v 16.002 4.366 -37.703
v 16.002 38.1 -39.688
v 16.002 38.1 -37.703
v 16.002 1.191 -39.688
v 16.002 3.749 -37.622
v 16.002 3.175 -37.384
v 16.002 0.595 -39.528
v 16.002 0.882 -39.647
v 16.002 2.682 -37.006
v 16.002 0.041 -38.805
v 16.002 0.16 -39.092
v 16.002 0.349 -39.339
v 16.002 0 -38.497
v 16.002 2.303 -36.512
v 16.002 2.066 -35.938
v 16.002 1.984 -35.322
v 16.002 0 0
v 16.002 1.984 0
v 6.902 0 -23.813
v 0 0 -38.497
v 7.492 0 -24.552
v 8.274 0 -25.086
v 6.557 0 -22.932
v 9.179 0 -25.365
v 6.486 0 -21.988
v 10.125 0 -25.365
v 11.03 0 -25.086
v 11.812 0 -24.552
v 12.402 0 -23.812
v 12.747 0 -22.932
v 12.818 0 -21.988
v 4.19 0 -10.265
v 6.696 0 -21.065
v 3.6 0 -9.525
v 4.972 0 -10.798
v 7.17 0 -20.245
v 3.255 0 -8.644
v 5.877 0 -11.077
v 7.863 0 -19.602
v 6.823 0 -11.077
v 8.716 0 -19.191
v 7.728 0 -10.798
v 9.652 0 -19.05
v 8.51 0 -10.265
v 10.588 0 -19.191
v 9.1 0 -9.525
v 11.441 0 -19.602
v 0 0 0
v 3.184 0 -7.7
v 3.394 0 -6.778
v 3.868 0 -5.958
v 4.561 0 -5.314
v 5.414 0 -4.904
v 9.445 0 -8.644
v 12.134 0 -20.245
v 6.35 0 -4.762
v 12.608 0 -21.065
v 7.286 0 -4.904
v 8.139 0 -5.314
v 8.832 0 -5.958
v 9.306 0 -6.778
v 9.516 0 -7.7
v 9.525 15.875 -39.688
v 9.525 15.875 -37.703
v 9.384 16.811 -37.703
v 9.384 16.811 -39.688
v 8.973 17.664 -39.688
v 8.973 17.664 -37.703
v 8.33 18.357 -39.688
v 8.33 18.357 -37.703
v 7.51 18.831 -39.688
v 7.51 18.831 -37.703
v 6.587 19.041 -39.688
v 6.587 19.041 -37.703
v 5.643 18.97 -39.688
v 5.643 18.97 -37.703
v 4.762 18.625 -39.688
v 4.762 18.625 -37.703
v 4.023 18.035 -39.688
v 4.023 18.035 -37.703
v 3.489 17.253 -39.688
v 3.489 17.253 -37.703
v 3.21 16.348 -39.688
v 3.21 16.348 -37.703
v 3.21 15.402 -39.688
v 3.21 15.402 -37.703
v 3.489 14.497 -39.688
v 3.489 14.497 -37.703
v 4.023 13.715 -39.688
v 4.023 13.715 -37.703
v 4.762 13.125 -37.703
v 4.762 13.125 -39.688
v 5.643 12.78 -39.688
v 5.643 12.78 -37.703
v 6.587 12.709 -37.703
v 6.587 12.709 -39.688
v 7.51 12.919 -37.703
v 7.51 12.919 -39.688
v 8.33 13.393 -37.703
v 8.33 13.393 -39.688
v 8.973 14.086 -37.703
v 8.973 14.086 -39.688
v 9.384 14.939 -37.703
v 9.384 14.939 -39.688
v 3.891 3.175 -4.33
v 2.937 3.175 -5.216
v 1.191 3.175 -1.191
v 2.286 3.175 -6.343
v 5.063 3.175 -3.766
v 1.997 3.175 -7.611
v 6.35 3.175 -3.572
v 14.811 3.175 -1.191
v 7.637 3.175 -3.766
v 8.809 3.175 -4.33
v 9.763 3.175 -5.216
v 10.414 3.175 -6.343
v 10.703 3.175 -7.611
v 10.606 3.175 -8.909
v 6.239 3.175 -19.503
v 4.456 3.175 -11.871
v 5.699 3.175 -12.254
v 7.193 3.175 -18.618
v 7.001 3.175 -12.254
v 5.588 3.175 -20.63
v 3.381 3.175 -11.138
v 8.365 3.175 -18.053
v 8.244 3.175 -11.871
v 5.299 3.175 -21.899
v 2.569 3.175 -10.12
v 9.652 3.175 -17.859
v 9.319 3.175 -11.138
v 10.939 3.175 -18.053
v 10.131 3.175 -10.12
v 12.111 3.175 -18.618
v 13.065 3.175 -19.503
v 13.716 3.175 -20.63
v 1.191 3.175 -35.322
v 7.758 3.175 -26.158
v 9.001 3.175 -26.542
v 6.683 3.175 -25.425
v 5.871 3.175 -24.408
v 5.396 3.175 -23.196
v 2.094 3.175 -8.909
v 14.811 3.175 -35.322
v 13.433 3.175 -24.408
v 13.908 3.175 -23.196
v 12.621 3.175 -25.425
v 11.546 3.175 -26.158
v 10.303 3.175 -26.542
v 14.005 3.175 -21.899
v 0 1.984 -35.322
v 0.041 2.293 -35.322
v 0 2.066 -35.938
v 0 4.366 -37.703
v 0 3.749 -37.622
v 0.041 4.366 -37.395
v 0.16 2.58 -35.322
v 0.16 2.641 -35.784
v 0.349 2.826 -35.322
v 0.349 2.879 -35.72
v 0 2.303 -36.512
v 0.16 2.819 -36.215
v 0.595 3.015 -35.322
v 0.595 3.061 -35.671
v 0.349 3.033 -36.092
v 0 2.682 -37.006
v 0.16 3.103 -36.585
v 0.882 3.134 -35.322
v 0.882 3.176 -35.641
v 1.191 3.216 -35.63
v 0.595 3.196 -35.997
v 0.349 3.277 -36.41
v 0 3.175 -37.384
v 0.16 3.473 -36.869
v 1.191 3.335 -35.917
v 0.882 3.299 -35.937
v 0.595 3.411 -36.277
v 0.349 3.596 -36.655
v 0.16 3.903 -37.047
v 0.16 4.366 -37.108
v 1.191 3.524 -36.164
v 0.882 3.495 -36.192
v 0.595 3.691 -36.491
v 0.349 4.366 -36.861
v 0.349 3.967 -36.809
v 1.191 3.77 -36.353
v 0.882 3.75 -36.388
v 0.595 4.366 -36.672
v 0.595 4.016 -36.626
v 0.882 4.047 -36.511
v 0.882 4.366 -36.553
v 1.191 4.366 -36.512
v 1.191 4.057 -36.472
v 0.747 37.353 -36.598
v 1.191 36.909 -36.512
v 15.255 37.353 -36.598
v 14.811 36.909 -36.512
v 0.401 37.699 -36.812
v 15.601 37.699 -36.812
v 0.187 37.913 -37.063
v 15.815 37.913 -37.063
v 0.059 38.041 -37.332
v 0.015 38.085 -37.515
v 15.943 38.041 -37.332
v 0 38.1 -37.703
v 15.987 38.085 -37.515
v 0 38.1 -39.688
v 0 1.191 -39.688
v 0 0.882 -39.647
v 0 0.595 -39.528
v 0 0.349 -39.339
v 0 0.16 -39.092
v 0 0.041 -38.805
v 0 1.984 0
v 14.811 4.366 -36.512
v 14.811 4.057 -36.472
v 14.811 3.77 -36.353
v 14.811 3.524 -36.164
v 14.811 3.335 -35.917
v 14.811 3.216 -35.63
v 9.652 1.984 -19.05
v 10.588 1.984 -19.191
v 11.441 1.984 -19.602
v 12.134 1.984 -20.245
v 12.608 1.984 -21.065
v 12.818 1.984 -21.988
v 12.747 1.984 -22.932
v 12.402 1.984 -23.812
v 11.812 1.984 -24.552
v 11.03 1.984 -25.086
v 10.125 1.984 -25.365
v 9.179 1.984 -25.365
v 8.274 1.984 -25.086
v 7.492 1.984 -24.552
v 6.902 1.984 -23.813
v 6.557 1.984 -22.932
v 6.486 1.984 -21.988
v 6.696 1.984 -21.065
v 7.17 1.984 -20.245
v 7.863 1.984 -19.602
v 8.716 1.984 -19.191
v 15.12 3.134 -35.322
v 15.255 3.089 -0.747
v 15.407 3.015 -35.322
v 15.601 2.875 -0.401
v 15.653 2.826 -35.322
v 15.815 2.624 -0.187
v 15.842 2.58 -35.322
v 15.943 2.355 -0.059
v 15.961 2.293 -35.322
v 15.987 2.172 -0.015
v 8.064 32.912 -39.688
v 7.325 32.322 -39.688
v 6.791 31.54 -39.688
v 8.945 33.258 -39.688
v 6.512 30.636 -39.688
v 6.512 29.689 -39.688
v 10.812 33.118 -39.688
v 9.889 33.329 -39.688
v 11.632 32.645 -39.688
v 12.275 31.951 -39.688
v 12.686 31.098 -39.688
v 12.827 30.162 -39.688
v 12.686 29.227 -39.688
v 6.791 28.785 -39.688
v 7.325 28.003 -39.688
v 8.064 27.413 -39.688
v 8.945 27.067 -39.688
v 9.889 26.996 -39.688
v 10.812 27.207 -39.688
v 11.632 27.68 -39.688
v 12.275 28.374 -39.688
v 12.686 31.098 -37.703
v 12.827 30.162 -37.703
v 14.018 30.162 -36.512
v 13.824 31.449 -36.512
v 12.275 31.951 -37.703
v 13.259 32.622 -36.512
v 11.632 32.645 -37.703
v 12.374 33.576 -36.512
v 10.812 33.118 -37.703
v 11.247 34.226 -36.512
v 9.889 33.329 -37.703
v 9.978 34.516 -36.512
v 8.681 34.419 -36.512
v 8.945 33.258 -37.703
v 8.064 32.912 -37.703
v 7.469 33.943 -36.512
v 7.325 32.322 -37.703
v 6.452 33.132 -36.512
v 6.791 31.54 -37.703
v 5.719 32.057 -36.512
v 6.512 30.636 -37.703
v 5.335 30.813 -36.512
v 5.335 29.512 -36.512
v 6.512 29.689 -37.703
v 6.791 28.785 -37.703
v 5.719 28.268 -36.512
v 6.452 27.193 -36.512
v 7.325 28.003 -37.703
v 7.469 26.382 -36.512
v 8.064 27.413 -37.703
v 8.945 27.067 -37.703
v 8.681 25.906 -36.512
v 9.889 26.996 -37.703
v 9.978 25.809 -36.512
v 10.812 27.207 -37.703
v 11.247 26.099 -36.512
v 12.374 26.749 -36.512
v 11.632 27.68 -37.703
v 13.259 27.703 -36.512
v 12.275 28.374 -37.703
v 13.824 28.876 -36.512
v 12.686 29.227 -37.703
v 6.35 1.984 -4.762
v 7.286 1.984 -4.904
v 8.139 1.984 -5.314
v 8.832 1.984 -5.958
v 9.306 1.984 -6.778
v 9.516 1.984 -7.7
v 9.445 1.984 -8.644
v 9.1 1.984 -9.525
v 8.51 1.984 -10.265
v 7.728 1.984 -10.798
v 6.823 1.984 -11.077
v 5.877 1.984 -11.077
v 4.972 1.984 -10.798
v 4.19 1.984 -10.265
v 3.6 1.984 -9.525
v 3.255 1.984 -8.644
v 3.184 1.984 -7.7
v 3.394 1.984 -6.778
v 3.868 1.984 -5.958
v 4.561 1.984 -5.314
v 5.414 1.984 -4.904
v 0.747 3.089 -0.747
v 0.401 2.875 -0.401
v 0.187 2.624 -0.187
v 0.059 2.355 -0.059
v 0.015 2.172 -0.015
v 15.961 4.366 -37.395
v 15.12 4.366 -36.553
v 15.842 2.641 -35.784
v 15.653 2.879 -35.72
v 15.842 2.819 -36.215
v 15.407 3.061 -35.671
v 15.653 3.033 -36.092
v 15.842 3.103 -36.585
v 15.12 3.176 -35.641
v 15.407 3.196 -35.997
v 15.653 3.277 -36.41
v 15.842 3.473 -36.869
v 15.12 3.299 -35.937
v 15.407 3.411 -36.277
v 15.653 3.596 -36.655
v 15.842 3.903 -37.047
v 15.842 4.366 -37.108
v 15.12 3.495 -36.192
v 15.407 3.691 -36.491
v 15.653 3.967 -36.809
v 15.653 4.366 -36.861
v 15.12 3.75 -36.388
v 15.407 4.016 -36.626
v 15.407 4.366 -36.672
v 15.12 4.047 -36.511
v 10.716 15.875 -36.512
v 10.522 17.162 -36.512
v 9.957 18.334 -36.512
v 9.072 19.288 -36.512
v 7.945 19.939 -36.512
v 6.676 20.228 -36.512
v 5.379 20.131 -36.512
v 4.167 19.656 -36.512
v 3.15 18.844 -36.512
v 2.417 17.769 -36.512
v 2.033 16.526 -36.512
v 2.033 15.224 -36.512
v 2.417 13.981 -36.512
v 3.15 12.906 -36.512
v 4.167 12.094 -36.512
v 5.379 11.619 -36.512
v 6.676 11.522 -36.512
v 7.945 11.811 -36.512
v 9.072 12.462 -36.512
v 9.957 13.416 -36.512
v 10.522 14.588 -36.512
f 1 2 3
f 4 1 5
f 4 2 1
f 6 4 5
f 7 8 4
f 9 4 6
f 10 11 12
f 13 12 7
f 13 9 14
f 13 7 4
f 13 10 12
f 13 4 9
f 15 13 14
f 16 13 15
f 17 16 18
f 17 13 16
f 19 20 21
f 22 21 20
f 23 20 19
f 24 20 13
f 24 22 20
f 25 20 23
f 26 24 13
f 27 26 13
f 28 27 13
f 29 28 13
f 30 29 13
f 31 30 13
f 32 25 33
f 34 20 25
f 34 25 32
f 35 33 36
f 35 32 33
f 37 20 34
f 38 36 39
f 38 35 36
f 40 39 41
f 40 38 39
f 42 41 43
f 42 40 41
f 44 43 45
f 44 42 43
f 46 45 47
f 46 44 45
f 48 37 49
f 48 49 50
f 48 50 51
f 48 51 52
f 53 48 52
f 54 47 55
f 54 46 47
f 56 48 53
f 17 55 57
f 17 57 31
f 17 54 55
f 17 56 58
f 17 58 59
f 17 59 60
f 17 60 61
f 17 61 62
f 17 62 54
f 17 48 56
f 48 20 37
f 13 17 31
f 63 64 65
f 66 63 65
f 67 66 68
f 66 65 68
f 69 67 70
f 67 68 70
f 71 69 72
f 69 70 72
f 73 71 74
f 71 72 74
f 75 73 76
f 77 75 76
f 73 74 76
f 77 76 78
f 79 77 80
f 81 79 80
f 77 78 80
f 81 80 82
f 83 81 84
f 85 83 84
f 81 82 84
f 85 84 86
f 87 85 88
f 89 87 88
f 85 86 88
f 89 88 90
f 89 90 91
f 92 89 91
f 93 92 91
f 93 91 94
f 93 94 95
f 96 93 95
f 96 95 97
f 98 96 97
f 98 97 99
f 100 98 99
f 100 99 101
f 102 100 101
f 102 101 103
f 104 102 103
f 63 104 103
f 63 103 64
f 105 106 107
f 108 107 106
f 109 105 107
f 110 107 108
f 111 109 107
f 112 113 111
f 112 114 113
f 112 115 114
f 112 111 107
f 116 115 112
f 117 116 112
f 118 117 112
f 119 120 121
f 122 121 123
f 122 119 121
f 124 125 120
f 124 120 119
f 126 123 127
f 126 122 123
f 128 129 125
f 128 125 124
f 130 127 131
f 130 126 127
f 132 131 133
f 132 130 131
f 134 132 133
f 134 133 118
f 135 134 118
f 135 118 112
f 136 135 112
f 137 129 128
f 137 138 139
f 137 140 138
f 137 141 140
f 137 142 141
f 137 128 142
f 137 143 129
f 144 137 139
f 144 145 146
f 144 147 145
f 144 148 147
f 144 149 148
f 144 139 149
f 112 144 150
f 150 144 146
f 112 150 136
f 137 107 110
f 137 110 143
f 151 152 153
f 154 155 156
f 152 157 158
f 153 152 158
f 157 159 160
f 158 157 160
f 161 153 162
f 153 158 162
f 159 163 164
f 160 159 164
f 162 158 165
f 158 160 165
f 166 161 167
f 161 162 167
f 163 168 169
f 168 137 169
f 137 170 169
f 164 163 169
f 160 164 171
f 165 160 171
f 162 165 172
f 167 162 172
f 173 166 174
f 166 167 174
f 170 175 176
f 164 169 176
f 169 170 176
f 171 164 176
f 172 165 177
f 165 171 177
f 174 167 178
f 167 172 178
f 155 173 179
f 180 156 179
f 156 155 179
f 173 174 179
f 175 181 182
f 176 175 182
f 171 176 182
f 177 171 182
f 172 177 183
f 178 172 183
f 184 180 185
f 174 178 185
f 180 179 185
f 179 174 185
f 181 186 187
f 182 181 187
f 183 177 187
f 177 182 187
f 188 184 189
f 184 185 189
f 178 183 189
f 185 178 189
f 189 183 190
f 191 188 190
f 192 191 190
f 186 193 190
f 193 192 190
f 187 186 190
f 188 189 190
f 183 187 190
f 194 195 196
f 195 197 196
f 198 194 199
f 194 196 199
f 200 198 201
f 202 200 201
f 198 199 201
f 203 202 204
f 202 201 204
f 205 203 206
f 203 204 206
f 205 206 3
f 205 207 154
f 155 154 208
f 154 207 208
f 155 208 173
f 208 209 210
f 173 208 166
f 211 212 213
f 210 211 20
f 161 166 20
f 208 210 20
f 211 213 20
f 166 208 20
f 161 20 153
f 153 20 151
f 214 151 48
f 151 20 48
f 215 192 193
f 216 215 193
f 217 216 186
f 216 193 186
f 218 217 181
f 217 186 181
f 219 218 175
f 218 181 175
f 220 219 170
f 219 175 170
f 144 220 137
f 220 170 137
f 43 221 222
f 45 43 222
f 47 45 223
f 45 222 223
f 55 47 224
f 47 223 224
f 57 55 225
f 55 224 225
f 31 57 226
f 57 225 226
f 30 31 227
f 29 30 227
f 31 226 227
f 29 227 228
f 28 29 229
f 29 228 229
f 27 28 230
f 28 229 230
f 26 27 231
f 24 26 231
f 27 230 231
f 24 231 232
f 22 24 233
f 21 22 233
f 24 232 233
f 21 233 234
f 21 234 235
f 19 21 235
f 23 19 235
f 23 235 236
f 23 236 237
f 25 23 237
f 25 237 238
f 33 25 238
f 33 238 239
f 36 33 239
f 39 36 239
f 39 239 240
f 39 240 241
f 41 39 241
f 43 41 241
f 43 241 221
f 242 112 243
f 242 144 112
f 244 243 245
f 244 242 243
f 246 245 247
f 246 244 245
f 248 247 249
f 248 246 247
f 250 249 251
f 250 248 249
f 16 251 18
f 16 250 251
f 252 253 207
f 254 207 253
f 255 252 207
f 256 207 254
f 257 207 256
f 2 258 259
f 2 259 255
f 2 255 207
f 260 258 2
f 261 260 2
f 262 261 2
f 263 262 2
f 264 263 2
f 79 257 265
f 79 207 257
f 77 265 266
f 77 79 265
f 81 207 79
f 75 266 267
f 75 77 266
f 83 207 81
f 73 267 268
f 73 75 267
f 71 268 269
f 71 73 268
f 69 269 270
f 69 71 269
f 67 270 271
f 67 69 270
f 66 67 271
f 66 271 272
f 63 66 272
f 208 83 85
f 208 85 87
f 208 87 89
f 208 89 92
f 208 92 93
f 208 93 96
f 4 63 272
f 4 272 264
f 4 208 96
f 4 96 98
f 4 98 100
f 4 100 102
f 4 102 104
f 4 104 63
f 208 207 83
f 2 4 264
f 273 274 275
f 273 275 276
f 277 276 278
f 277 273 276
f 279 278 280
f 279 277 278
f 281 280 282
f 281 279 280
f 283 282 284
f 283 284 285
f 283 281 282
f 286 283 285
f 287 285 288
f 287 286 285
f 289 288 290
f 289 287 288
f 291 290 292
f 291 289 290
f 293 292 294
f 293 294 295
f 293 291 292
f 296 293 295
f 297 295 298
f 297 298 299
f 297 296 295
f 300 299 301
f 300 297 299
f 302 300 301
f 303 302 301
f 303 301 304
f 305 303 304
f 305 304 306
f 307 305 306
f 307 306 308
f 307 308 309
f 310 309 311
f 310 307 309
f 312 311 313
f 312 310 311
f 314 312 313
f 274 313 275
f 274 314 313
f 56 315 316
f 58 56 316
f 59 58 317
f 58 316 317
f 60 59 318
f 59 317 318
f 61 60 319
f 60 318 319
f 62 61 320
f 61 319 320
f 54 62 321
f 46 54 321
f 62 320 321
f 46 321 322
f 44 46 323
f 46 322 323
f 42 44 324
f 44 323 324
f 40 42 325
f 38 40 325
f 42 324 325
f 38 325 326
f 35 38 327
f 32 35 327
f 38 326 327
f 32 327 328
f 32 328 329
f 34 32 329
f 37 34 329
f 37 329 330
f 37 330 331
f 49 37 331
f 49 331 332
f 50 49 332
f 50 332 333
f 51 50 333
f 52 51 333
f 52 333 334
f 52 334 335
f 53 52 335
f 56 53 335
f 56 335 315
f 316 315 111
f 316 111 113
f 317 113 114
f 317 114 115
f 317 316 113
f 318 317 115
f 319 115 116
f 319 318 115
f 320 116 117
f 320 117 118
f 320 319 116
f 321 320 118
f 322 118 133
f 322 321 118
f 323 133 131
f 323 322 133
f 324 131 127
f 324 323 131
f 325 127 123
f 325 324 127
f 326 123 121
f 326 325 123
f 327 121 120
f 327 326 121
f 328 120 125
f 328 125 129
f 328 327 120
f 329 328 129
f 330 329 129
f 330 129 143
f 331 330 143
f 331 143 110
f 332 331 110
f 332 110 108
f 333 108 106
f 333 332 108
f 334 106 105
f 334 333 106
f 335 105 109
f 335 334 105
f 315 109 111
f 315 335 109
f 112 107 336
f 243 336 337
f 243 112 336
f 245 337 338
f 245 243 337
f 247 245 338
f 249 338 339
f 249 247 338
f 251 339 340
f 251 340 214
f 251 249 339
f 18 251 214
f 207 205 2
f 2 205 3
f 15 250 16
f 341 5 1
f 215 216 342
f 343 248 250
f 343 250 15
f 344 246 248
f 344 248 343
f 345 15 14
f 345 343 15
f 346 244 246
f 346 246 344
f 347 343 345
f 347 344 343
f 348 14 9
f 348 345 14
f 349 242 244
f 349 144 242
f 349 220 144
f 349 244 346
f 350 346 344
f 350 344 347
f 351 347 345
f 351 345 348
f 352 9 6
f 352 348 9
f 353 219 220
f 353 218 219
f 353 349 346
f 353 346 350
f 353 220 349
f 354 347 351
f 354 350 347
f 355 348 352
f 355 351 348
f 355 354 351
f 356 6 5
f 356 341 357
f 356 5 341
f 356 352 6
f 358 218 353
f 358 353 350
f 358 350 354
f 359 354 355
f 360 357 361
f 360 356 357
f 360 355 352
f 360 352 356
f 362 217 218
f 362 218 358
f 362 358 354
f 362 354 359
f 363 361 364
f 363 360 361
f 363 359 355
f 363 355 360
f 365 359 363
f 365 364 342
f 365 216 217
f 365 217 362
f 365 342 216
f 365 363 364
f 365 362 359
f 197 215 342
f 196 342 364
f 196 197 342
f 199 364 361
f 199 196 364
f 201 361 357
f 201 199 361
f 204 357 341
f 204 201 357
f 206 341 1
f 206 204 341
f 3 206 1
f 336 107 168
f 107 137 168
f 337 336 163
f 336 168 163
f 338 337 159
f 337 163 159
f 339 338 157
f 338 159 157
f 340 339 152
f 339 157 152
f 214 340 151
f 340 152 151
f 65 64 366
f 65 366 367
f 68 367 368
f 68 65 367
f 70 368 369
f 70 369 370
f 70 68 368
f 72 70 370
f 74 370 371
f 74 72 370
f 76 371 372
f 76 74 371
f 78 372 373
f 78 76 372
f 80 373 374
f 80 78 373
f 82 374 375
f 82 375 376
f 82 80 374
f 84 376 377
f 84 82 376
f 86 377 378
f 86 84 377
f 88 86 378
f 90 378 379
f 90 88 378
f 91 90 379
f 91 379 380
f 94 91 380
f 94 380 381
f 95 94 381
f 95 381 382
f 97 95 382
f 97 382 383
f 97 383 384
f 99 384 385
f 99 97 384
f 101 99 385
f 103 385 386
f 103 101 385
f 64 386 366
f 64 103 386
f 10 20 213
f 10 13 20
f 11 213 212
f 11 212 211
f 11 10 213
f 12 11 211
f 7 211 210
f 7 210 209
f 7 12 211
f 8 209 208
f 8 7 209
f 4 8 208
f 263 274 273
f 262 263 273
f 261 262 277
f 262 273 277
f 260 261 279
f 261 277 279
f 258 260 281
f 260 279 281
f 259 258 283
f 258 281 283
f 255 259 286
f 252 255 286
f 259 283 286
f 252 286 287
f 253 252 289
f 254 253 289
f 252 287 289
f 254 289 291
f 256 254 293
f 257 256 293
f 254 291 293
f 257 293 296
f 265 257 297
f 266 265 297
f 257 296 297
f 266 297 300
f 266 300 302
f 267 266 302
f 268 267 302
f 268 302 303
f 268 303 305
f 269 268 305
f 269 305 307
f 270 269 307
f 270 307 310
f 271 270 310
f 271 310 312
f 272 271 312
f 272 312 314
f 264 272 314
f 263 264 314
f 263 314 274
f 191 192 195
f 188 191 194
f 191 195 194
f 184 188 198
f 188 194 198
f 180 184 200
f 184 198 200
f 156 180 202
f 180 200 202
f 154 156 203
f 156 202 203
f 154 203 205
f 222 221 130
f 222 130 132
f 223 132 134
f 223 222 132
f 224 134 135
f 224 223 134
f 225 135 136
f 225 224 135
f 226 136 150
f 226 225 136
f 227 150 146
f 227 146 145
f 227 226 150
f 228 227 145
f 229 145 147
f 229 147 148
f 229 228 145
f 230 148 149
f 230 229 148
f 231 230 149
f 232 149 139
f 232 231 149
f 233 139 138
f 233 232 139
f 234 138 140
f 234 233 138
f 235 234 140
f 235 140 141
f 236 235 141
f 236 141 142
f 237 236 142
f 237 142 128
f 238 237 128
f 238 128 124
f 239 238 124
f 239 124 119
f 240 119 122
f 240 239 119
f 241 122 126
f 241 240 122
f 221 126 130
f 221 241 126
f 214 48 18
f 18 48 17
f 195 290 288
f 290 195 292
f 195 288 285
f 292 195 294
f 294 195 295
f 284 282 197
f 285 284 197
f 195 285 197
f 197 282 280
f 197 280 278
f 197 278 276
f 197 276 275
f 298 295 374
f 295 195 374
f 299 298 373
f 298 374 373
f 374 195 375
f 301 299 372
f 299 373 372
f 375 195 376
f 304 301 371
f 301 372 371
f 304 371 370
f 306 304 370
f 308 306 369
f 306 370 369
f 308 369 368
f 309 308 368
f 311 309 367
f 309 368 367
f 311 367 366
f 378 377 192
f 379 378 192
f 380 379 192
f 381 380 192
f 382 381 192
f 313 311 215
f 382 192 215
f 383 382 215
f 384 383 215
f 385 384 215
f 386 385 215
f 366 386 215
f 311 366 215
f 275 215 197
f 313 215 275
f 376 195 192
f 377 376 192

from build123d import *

# Parameters (mm, degrees)
SKETCH1_W           = 16.002
SKETCH1_H           = 38.1
BOSS_EXTRUDE1_DEPTH = 3.175
SKETCH2_W           = 16.002
SKETCH2_H           = 3.175
BOSS_EXTRUDE2_DEPTH = 38.1
SKETCH3_R           = 3.175
CUT_EXTRUDE1_DEPTH  = 56.143781701
SKETCH4_R           = 3.175
CUT_EXTRUDE2_DEPTH  = 56.235109172
CHAMFER1_SIZE       = 1.190625
FILLET1_R           = 1.190625


with BuildPart() as part:
    # Sketch1 → Boss-Extrude1 (new body)
    with BuildSketch(Plane(origin=(0, 0, 0), x_dir=(1, 0, 0), z_dir=(0, 1, 0))):
        with Locations((8.001, 19.05)):
            Rectangle(SKETCH1_W, SKETCH1_H)
    extrude(amount=BOSS_EXTRUDE1_DEPTH)

    # Sketch2 → Boss-Extrude2 (add)
    with BuildSketch(Plane.XZ):
        with Locations((8.001, -38.1)):
            Rectangle(SKETCH2_W, SKETCH2_H)
    extrude(amount=-BOSS_EXTRUDE2_DEPTH)

    # Sketch3 → Cut-Extrude1 (cut, through all)
    with BuildSketch(Plane.XY.offset(-36.5125)):
        with Locations((9.652, 30.1625)):
            Circle(SKETCH3_R)
        with Locations((6.35, 15.875)):
            Circle(SKETCH3_R)
    extrude(amount=-CUT_EXTRUDE1_DEPTH, mode=Mode.SUBTRACT)

    # Sketch4 → Cut-Extrude2 (cut, through all)
    with BuildSketch(Plane(origin=(0, 3.175, 0), x_dir=(1, 0, 0), z_dir=(0, 1, 0))):
        with Locations(Location((9.652, 22.225, 0), (0, 0, 270))):
            Circle(SKETCH4_R)
        with Locations(Location((6.35, 7.9375, 0), (0, 0, 270))):
            Circle(SKETCH4_R)
    extrude(amount=-CUT_EXTRUDE2_DEPTH, mode=Mode.SUBTRACT)

    # Chamfer1
    chamfer1_edges = [part.edges().sort_by_distance(p)[0] for p in [
        (6.477, 30.1625, -36.5125),
        (3.175, 15.875, -36.5125),
        (9.652, 3.175, -25.4),
        (6.35, 3.175, -11.1125),
    ]]
    chamfer(chamfer1_edges, length=CHAMFER1_SIZE)

    # Fillet1
    fillet1_edges = [part.edges().sort_by_distance(p)[0] for p in [
        (16.002, 3.175, -18.25625),
        (0, 3.175, -18.25625),
        (8.001, 0, -39.6875),
        (8.001, 38.1, -36.5125),
        (0, 20.6375, -36.5125),
        (16.002, 20.6375, -36.5125),
        (8.001, 3.175, -36.5125),
        (8.001, 3.175, 0),
    ]]
    fillet(fillet1_edges, radius=FILLET1_R)


solid = part.part
